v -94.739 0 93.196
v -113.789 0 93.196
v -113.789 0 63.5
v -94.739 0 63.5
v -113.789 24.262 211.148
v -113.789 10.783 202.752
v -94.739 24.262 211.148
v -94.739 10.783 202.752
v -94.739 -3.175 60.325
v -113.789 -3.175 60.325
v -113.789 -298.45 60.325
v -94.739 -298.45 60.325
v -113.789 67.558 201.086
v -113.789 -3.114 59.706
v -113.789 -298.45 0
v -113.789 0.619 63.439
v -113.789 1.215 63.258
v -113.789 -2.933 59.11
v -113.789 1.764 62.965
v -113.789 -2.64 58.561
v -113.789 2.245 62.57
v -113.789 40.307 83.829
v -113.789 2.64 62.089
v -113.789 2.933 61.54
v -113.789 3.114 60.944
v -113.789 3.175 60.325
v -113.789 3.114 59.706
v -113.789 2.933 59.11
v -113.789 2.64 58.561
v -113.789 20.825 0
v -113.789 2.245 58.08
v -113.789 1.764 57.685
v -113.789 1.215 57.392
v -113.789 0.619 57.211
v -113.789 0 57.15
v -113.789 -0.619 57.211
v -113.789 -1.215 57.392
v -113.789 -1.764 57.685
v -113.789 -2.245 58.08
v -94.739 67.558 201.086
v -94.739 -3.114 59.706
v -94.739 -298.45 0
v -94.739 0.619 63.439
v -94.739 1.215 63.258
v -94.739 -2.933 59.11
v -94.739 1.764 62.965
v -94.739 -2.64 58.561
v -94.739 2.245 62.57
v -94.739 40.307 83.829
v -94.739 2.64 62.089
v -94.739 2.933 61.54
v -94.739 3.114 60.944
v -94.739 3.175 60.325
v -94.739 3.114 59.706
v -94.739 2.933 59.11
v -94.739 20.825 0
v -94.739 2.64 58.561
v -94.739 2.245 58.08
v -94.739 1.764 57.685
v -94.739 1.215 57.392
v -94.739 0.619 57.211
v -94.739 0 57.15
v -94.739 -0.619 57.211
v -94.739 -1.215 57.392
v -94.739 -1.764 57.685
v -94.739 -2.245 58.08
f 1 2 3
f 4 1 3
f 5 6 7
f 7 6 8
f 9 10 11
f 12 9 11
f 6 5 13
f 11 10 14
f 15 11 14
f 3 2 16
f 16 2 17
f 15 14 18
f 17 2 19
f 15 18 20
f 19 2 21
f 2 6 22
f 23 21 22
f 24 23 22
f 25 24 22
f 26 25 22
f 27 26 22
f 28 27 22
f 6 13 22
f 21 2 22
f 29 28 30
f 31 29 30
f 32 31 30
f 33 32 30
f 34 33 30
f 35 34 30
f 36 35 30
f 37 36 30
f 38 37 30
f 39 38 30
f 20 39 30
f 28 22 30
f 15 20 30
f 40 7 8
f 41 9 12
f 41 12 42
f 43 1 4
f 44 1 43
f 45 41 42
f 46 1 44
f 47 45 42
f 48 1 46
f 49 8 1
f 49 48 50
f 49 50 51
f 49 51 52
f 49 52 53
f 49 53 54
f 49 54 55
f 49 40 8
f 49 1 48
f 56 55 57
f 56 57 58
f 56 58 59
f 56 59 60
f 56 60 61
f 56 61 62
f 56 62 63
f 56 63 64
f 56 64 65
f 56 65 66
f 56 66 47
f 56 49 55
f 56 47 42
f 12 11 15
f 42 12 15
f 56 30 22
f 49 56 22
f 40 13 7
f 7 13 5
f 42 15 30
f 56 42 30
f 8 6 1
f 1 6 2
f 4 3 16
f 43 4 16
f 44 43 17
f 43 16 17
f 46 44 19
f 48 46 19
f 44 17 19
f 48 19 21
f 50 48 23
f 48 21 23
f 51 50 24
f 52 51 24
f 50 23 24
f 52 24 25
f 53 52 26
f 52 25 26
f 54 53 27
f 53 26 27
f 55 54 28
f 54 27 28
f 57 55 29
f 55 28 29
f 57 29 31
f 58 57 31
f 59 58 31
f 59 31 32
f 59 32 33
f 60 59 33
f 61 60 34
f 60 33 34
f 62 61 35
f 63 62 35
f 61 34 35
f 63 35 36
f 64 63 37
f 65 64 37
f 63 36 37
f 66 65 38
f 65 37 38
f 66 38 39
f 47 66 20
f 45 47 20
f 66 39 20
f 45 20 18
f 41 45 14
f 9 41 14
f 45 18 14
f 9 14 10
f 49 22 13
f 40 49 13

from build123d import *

# Parameters (mm, degrees)
BOSS_EXTRUDE1_DEPTH = 19.05
BOSS_EXTRUDE2_DEPTH = 19.05
CHAMFER1_SIZE       = 12.7
CHAMFER1_SIZE2      = 11.325028866


with BuildPart() as part:
    # Sketch2 → Boss-Extrude1 (new body)
    with BuildSketch(Plane(origin=(-113.788766336, 0, 0), x_dir=(0, 0, -1), z_dir=(1, 0, 0))):
        with BuildLine():
            Line((0, 20.824633003), (-83.828599938, 40.306941911))
            Line((-83.828599938, 40.306941911), (-93.196193981, 0))
            Line((-93.196193981, 0), (-63.5, 0))
            ThreePointArc((-63.5, 0), (-58.07993597, 2.24506403), (-60.325, -3.175))
            Line((-60.325, -3.175), (-60.325, -298.45))
            Line((-60.325, -298.45), (0, -298.45))
            Line((0, -298.45), (0, 20.824633003))
        make_face()
    extrude(amount=BOSS_EXTRUDE1_DEPTH)

    # Sketch3 → Boss-Extrude2 (add, through all)
    with BuildSketch(Plane.ZY.offset(113.788766336)):
        Polygon((83.828599938, 40.306941911), (201.08567571, 67.558244849), (214.022912031, 11.891823944), (93.196193981, 0), align=None)
    extrude(amount=-BOSS_EXTRUDE2_DEPTH)

    # Chamfer1
    chamfer1_edges = [part.edges().sort_by_distance(p)[0] for p in [
        (-104.263766336, 11.891823944, 214.022912031),
    ]]
    chamfer1_side = [part.faces().sort_by_distance(p)[0] for p in [
        (-104.263766336, 39.725034397, 207.554293871),
    ]]
    chamfer(chamfer1_edges, length=CHAMFER1_SIZE, length2=CHAMFER1_SIZE2, reference=chamfer1_side[0])


solid = part.part
